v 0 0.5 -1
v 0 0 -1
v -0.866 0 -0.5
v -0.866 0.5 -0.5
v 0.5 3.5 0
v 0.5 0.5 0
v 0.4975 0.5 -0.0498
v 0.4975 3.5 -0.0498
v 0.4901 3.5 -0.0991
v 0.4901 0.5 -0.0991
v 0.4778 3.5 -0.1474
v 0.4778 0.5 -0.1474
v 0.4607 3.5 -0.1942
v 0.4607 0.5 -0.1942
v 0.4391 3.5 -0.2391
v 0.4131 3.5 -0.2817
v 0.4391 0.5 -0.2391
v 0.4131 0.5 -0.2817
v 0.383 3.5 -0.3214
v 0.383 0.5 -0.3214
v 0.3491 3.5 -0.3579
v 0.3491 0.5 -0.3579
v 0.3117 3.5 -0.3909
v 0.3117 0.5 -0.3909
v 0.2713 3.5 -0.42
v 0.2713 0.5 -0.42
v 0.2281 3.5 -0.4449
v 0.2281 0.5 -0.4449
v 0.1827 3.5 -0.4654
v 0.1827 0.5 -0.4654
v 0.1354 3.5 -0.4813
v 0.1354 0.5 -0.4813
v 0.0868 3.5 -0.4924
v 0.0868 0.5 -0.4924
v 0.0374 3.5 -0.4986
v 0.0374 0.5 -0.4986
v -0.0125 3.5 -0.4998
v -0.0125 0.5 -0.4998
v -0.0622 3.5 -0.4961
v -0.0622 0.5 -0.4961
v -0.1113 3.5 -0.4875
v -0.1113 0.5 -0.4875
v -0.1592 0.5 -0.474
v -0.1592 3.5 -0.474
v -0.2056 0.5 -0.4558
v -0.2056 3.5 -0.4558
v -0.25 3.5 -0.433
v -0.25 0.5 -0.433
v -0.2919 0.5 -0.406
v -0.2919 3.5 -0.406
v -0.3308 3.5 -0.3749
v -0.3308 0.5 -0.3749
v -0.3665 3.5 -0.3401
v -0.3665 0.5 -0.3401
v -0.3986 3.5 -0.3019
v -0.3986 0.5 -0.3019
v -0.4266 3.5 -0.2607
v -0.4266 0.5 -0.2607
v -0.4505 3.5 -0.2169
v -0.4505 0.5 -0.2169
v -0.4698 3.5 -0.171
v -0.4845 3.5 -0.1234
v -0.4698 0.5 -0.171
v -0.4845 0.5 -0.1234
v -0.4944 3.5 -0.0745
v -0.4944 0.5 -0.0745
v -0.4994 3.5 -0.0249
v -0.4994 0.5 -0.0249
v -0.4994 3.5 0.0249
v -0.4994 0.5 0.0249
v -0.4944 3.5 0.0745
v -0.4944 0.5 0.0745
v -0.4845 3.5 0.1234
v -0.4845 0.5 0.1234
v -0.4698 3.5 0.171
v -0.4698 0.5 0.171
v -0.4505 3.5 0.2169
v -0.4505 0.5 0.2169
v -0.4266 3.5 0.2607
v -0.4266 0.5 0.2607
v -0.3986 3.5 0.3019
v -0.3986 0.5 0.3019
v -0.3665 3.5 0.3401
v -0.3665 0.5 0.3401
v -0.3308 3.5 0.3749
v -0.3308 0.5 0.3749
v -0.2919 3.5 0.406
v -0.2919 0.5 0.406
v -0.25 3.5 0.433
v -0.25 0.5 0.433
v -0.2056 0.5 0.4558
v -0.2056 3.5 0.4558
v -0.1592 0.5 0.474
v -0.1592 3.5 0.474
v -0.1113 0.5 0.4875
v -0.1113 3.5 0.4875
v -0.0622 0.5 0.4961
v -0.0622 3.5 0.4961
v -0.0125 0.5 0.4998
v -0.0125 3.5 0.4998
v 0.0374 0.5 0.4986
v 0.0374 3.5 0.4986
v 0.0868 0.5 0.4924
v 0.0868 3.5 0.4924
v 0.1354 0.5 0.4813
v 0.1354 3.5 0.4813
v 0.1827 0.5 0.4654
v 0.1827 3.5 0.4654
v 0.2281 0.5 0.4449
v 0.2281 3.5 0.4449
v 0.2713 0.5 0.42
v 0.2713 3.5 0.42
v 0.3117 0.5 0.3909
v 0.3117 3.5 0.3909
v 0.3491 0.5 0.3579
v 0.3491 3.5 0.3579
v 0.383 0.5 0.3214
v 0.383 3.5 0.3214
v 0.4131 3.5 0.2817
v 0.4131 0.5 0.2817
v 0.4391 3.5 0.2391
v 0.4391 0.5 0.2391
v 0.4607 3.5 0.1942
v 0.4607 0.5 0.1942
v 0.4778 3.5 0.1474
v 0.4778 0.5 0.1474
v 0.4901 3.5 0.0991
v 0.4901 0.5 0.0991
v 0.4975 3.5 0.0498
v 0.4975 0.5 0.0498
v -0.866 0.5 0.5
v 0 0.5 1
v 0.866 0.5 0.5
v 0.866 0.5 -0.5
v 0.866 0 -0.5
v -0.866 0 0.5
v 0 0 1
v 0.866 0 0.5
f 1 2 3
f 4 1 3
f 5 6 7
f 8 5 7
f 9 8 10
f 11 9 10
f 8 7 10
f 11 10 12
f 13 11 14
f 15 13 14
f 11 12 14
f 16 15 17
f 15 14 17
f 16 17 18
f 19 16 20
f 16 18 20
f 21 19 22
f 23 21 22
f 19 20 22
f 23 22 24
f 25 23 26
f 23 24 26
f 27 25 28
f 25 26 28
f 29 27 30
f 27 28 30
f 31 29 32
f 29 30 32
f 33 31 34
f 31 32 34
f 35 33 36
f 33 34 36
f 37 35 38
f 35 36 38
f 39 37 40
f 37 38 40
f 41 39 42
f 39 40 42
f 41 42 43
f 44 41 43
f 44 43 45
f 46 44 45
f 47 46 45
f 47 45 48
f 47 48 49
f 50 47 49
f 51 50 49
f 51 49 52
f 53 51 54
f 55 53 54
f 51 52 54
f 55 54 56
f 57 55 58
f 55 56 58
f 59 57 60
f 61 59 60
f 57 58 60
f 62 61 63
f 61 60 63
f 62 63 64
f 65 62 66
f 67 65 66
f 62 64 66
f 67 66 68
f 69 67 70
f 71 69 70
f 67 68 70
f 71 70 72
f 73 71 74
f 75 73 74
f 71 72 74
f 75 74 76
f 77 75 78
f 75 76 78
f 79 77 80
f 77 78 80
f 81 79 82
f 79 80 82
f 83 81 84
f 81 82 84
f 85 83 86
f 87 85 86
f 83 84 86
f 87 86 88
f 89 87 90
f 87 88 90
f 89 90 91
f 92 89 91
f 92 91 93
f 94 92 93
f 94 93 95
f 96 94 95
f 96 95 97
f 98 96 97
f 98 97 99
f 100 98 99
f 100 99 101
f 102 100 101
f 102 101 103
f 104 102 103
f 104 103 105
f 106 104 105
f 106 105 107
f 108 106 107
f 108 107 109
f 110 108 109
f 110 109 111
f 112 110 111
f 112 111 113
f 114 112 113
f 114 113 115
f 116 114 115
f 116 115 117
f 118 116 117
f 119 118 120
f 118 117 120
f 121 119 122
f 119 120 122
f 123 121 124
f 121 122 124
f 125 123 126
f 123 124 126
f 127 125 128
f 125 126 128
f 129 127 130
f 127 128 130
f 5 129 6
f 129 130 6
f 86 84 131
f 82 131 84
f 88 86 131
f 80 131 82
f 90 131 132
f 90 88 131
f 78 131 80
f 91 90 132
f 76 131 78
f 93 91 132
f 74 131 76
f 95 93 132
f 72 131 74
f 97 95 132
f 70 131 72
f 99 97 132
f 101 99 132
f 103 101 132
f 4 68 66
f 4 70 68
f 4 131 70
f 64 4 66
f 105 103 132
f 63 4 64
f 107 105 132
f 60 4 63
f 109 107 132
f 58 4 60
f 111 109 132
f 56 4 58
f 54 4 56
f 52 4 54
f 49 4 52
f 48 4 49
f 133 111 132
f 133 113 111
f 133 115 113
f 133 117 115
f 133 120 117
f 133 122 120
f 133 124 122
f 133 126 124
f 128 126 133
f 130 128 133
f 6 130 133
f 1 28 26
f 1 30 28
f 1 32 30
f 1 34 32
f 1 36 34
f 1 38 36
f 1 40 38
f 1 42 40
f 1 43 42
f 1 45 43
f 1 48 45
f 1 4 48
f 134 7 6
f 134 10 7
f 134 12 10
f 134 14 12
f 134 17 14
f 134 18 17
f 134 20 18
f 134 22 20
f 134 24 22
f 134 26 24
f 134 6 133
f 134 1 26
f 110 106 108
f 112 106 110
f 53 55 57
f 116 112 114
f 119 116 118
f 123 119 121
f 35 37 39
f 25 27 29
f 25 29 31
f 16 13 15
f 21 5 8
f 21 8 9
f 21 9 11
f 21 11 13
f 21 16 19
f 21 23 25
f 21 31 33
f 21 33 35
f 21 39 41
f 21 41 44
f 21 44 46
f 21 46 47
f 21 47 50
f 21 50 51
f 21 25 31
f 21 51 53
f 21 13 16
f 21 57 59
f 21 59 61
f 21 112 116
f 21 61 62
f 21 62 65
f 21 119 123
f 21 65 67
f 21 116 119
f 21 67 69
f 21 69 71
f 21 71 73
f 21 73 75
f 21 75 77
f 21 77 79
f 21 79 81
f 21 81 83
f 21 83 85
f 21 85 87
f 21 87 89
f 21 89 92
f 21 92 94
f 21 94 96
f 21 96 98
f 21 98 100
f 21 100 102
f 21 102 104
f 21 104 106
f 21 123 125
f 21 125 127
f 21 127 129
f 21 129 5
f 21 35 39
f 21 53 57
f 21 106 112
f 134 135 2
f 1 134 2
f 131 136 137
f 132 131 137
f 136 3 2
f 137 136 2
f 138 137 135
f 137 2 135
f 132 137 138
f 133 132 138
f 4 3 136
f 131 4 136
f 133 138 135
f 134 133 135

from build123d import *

# Parameters (mm, degrees)
SKETCH1_R           = 1
BOSS_EXTRUDE1_DEPTH = 0.5
SKETCH2_R           = 0.5
BOSS_EXTRUDE2_DEPTH = 3
SKETCH3_OUTSIDE_W   = 4.9
SKETCH3_OUTSIDE_H   = 4.9
CUT_EXTRUDE1_DEPTH  = 10


with BuildPart() as part:
    # Sketch1 → Boss-Extrude1 (new body)
    with BuildSketch(Plane(origin=(0, 0, 0), x_dir=(1, 0, 0), z_dir=(0, 1, 0))):
        Circle(SKETCH1_R)
    extrude(amount=BOSS_EXTRUDE1_DEPTH)

    # Sketch2 → Boss-Extrude2 (add)
    with BuildSketch(Plane(origin=(0, 0.5, 0), x_dir=(1, 0, 0), z_dir=(0, 1, 0))):
        Circle(SKETCH2_R)
    extrude(amount=BOSS_EXTRUDE2_DEPTH)

    # Sketch3 outside → Cut-Extrude1 (cut)
    with BuildSketch(Plane(origin=(0, 0, 0), x_dir=(-1, 0, 0), z_dir=(0, -1, 0))):
        Rectangle(SKETCH3_OUTSIDE_W, SKETCH3_OUTSIDE_H)
        Polygon((0, 1), (0.866025404, 0.5), (0.866025404, -0.5), (0, -1), (-0.866025404, -0.5), (-0.866025404, 0.5), align=None, mode=Mode.SUBTRACT)
    extrude(amount=-CUT_EXTRUDE1_DEPTH, mode=Mode.SUBTRACT)


solid = part.part
